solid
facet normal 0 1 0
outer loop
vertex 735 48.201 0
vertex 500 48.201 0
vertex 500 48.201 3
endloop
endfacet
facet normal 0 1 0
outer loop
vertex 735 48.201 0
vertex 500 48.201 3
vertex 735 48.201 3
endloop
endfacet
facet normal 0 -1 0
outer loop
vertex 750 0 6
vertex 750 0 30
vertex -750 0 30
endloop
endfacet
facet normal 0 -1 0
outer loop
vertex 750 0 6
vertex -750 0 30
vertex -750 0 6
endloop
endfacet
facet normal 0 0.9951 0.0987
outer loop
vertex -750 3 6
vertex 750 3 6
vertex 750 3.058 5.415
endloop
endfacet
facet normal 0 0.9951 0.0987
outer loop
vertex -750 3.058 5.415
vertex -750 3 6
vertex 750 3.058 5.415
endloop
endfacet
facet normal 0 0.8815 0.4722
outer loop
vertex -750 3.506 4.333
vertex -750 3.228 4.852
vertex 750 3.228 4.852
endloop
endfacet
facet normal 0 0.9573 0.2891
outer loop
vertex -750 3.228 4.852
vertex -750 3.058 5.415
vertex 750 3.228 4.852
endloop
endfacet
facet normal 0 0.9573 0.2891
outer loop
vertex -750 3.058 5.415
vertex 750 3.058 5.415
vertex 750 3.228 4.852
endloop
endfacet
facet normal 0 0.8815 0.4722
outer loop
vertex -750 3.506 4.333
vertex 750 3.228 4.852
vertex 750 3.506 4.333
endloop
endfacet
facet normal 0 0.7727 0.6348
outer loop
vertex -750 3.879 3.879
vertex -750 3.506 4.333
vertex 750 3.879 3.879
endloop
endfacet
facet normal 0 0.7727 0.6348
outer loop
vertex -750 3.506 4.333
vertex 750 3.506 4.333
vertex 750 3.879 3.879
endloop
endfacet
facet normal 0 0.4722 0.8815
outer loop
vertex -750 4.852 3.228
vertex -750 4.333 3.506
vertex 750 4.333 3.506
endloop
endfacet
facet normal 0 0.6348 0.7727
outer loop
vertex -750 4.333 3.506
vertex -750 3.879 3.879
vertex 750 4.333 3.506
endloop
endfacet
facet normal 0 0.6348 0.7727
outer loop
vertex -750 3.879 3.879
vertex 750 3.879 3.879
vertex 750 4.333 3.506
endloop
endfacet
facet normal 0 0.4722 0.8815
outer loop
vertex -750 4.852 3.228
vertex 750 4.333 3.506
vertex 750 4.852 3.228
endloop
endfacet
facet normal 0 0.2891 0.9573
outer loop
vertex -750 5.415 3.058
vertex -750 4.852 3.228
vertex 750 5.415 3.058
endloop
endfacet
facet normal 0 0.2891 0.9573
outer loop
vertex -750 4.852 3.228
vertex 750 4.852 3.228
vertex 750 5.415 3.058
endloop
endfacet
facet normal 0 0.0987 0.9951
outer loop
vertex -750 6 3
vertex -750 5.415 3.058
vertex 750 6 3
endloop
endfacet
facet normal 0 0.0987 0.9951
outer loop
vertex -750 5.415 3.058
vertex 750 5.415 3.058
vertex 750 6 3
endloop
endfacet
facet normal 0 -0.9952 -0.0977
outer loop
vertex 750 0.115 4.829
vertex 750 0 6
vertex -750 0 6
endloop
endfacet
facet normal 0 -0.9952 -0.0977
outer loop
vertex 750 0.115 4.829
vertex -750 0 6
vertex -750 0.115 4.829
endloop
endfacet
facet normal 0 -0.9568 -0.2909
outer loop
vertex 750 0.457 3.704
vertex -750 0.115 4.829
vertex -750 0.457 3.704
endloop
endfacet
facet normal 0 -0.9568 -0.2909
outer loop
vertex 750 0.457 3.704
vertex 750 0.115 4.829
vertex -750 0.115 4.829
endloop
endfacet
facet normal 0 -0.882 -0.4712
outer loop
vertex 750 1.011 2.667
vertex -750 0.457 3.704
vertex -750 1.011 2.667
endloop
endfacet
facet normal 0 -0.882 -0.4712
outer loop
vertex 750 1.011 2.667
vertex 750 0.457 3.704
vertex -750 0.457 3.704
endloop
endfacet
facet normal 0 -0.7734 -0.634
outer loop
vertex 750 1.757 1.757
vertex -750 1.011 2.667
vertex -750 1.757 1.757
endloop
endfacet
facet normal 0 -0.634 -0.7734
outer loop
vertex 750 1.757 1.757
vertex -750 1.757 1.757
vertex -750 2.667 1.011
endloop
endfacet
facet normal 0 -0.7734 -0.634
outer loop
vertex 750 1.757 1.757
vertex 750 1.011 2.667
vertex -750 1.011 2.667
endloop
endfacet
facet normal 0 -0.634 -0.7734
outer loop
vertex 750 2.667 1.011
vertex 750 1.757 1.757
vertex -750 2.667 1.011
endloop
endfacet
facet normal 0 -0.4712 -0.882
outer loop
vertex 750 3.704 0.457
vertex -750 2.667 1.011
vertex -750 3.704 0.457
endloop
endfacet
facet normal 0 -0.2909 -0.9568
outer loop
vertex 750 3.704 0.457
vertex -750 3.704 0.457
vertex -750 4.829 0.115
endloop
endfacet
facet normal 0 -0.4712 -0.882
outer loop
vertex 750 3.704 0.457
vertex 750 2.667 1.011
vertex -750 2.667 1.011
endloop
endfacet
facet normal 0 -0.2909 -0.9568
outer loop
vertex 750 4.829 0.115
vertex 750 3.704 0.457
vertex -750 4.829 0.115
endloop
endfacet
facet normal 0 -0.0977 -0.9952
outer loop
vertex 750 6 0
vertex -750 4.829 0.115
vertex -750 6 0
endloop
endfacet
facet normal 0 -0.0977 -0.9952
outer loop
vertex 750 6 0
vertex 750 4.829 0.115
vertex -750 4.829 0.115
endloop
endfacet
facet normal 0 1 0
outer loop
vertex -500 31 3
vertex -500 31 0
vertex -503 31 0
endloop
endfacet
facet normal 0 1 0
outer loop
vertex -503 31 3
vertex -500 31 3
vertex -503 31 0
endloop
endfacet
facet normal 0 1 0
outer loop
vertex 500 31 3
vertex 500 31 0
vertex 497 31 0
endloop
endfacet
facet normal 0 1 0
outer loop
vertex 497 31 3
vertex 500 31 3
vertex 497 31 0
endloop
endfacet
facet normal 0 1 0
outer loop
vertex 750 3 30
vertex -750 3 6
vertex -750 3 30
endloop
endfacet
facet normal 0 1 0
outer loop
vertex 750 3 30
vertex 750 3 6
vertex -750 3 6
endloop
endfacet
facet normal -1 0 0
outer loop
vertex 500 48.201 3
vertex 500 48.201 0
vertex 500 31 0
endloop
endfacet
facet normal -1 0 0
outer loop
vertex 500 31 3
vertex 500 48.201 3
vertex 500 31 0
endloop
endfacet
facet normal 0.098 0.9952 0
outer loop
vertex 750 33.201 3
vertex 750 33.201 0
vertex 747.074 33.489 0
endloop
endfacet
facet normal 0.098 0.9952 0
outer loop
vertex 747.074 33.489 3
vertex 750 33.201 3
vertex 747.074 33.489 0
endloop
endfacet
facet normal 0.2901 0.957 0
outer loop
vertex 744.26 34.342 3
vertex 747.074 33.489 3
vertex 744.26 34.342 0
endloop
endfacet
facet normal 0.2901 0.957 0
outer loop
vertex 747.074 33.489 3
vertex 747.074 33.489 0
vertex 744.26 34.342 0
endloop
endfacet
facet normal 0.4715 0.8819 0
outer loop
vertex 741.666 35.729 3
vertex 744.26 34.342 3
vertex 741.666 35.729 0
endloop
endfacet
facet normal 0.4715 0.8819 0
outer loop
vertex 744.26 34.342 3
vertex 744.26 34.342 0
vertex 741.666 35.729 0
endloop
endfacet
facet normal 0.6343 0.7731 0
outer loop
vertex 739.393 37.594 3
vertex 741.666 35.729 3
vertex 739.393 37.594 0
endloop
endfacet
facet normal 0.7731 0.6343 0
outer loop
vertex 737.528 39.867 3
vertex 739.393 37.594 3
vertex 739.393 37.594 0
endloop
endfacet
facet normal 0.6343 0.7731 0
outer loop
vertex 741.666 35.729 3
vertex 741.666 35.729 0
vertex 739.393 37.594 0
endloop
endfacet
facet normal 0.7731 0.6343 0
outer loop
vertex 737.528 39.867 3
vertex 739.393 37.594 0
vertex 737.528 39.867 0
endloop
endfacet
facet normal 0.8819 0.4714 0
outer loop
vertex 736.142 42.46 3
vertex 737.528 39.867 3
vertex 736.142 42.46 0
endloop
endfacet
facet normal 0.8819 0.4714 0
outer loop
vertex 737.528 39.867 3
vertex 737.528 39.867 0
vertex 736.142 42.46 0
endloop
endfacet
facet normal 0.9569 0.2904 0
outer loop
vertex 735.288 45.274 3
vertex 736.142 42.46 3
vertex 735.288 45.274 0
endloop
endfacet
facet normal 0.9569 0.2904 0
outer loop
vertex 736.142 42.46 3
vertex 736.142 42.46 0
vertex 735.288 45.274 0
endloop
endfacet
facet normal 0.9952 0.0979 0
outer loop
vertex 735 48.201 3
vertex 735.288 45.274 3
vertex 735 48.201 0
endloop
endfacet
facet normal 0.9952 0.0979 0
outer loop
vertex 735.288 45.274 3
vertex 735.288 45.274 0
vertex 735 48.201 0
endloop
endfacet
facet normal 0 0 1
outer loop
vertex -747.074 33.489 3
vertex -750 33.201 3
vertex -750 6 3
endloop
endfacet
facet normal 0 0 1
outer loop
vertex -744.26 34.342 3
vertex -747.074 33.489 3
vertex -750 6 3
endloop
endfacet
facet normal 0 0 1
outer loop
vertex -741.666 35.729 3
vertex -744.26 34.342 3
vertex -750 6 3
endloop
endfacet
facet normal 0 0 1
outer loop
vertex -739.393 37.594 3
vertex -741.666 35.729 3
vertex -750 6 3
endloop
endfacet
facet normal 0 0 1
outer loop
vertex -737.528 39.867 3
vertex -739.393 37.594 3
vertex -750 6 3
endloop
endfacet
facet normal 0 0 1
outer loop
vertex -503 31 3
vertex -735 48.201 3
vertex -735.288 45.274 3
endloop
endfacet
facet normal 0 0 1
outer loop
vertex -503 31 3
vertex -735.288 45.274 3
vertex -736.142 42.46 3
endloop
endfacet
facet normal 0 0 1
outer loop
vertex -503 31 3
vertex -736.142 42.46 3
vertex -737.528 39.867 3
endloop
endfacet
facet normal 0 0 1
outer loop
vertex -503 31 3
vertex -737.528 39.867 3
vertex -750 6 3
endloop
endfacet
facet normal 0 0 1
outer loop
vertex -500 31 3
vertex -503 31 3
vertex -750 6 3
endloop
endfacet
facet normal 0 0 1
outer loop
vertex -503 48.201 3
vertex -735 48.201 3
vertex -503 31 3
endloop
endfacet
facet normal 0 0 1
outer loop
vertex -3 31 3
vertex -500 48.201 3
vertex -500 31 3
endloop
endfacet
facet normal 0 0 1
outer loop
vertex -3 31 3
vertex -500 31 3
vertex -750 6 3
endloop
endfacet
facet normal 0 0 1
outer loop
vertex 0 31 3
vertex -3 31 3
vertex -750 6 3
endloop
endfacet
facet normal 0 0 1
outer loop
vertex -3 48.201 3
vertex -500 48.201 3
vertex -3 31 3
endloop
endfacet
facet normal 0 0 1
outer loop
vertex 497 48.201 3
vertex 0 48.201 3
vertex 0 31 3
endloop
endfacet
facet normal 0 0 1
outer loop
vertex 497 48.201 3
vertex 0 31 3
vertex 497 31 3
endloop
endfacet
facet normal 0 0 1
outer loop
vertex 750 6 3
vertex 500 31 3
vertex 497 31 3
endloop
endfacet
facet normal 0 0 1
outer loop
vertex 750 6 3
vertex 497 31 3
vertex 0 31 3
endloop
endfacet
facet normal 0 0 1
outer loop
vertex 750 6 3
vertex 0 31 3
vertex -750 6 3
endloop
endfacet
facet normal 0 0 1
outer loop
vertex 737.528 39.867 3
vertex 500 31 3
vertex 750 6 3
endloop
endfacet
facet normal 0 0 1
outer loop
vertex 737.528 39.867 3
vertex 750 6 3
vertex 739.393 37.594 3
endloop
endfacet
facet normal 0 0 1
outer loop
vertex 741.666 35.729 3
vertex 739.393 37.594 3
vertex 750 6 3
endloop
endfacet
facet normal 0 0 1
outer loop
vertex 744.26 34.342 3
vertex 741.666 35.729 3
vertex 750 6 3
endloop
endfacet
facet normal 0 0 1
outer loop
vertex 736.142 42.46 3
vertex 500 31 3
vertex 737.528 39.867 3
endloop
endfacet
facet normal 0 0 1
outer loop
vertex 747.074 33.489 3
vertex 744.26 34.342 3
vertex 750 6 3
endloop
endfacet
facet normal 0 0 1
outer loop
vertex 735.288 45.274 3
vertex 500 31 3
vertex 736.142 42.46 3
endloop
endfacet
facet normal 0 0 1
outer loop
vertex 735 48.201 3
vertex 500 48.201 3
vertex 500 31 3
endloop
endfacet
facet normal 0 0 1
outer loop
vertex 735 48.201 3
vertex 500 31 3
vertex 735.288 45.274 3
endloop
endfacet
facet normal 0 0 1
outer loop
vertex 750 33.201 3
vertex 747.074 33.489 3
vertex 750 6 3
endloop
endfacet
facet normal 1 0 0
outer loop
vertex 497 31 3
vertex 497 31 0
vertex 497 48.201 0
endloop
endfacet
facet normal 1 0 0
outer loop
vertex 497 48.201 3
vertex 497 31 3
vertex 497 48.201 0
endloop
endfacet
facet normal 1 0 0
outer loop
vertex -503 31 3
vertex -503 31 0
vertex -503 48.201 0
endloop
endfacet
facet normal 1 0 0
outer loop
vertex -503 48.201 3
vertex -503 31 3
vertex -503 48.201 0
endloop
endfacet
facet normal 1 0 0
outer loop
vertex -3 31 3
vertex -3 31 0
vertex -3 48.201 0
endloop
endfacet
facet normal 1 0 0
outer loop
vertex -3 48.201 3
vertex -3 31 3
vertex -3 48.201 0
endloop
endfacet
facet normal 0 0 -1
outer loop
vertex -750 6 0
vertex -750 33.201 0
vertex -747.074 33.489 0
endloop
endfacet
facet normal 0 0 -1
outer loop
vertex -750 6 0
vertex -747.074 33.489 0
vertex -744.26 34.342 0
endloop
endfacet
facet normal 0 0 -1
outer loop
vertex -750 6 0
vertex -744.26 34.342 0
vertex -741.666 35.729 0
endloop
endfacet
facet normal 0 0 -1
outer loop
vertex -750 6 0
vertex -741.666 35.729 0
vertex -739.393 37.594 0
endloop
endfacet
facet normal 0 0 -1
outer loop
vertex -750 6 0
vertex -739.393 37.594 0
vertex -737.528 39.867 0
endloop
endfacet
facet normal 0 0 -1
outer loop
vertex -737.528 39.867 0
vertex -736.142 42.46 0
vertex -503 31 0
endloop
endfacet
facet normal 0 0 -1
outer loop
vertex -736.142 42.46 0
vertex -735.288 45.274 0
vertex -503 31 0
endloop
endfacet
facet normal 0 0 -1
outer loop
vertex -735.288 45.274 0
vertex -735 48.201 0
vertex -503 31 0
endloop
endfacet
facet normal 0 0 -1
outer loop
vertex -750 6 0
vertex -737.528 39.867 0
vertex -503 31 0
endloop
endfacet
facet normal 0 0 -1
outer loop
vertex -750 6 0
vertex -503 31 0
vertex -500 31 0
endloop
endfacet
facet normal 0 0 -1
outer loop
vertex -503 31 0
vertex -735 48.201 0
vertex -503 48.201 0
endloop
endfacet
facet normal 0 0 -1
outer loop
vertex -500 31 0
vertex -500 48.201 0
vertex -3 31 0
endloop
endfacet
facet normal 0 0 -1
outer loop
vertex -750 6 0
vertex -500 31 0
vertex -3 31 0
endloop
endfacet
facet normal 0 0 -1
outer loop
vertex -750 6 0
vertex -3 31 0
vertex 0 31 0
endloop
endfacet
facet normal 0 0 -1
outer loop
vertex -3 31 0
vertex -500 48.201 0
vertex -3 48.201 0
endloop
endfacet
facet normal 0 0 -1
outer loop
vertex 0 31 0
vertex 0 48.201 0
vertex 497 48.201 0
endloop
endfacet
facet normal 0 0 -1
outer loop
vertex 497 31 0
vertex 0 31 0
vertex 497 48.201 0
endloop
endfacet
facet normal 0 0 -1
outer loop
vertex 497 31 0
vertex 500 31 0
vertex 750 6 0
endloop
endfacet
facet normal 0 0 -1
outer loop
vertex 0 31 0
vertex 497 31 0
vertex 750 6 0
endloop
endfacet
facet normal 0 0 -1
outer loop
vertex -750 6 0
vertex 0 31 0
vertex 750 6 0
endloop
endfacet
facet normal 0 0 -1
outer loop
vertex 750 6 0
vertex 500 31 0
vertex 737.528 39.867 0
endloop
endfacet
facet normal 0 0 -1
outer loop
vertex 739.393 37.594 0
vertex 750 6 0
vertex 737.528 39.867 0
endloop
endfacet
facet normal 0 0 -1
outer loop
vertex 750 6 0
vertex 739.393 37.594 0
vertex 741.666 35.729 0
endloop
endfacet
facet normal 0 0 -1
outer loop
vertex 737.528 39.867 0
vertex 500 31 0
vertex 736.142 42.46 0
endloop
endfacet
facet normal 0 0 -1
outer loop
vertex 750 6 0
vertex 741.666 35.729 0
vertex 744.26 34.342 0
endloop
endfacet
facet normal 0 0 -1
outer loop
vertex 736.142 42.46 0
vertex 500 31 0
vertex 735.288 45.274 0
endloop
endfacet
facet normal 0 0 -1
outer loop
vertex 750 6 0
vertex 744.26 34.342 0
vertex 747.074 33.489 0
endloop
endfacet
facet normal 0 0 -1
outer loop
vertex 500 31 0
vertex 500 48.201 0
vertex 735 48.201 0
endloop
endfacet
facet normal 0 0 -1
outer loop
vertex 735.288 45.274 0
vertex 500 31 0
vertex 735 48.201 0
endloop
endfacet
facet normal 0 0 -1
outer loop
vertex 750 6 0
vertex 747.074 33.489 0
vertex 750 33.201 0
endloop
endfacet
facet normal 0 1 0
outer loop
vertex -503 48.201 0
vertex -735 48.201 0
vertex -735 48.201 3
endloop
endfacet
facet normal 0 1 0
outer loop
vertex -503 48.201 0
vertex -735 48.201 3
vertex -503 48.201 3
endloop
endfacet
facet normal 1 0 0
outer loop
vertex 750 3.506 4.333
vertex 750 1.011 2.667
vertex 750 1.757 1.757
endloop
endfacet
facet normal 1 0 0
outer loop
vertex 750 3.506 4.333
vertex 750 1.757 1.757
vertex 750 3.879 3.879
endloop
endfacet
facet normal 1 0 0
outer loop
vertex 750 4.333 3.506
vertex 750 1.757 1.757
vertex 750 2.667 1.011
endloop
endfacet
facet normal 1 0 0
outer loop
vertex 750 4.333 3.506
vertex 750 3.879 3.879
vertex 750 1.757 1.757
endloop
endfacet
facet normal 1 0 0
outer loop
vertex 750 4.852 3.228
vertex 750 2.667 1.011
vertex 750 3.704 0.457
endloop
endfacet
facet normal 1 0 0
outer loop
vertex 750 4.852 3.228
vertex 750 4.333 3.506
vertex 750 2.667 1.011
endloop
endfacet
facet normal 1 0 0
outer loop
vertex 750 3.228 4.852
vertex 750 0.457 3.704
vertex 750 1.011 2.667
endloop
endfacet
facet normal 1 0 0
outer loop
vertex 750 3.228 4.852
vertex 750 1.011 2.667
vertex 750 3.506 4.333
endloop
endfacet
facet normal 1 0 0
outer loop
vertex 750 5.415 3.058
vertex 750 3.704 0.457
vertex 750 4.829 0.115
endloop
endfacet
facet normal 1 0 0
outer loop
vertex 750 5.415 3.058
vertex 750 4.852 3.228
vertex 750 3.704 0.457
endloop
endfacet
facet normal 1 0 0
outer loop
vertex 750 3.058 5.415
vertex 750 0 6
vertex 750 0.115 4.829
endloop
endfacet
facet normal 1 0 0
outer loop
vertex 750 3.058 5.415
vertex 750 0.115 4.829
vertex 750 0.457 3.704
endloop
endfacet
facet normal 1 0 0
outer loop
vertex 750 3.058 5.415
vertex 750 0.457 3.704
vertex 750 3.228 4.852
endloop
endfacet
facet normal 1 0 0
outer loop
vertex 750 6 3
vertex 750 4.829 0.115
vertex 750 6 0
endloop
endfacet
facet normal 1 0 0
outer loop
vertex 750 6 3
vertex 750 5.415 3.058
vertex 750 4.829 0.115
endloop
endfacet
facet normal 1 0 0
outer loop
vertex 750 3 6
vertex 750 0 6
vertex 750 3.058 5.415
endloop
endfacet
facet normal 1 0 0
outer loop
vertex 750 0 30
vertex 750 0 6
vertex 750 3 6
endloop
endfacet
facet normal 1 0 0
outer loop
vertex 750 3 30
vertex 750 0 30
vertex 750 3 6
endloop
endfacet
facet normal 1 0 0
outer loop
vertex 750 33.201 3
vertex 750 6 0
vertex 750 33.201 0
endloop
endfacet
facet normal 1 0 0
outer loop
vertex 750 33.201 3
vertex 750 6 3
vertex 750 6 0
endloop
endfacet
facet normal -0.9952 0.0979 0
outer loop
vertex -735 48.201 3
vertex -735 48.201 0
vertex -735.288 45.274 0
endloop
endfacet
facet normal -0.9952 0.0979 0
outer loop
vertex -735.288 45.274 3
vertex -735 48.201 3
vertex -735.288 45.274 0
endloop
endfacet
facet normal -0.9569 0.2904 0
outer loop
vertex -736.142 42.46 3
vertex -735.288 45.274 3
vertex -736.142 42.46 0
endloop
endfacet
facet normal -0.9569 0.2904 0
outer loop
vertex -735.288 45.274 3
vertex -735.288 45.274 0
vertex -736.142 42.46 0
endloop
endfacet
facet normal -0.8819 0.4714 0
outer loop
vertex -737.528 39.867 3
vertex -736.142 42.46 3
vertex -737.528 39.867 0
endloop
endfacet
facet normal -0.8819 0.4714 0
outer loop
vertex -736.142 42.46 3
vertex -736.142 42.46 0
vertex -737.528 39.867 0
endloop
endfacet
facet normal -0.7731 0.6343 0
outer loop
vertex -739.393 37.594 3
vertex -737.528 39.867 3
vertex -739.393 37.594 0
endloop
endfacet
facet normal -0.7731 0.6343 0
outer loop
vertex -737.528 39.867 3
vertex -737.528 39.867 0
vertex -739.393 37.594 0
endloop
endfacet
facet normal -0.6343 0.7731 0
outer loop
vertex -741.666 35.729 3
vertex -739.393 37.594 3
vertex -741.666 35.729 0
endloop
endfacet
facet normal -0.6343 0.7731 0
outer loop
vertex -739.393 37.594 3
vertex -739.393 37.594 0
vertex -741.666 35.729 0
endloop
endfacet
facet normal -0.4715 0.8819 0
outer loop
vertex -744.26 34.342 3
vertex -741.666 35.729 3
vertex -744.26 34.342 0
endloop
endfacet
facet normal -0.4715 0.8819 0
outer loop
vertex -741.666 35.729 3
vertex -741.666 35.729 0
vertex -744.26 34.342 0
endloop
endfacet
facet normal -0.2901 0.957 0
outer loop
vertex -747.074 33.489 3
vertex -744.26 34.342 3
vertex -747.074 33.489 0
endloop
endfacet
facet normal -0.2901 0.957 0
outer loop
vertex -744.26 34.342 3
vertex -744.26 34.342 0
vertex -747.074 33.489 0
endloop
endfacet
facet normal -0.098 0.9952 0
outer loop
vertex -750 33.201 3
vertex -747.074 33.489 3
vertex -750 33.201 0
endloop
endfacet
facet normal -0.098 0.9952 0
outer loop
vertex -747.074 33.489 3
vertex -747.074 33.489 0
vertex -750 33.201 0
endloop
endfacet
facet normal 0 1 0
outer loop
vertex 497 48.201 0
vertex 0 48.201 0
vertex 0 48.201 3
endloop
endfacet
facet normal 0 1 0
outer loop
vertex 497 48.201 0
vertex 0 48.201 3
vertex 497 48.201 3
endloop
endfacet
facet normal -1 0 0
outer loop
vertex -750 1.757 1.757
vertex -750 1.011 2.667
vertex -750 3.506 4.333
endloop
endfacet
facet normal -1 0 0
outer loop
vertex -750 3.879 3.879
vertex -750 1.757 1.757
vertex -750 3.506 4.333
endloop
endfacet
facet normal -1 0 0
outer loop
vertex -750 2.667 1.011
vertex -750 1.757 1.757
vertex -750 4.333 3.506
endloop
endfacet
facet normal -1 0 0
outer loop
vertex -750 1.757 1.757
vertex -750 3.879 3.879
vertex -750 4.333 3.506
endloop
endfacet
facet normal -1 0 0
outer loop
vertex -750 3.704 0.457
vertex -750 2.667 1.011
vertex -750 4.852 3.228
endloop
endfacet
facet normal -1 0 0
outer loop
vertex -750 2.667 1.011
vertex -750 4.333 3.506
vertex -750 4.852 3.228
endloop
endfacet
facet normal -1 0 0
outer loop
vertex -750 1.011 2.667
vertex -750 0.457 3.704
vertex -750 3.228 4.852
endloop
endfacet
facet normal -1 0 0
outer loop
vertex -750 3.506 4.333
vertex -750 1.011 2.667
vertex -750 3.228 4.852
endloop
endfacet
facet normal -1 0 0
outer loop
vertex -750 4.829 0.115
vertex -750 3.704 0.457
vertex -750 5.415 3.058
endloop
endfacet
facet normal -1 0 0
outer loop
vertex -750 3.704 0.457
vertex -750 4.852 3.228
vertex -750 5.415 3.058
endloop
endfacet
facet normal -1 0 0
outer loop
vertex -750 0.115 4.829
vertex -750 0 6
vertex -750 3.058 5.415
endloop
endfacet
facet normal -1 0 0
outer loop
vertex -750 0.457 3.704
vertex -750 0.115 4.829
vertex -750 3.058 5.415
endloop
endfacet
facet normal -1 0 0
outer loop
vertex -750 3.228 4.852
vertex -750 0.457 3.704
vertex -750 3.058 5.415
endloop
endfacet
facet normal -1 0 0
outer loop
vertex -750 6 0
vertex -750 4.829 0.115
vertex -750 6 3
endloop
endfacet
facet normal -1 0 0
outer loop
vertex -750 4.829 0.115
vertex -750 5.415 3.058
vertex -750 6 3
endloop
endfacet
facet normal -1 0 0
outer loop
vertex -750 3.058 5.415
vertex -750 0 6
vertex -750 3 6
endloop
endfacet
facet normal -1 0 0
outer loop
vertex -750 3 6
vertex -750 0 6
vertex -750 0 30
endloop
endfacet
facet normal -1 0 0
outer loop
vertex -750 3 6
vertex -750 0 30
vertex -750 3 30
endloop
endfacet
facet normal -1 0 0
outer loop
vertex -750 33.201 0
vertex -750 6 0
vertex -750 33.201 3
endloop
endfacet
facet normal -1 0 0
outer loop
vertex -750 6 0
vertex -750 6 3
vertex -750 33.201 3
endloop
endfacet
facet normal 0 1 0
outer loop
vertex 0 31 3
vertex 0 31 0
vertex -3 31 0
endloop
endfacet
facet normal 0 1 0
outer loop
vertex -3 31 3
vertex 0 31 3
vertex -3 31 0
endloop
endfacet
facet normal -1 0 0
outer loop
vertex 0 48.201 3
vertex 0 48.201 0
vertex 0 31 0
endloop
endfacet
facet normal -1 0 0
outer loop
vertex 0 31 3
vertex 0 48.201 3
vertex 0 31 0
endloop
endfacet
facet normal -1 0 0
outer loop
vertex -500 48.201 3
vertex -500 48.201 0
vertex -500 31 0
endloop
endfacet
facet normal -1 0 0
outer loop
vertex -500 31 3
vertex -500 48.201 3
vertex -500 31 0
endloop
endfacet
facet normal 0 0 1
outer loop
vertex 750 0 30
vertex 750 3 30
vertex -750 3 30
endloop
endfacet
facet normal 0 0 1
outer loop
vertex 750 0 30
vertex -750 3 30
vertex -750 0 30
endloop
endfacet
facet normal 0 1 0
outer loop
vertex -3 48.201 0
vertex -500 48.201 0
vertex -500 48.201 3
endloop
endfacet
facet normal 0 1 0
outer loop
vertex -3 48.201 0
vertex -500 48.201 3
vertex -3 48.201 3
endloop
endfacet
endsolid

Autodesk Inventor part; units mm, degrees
ref_plane "YZ Plane" through (0, 0, 0) normal (1, 0, 0) x (0, 1, 0)
ref_plane "XZ Plane" through (0, 0, 0) normal (0, 1, 0) x (-1, 0, 0)
ref_plane "XY Plane" through (0, 0, 0) normal (0, 0, 1) x (1, 0, 0)
sketch "Sketch1" plane through (0, 0, 0) normal (0, 0, 1) x (1, 0, 0)
  line L0 (-750, 48.2006) -> (750, 48.2006)
  line L1 (750, 48.2006) -> (750, 0)
  line L2 (750, 0) -> (-750, 0)
  line L3 (-750, 0) -> (-750, 48.2006)
  point P0 (0, 0)
  point P1 (0, 0)
  dimension "d0" = 1500
  dimension "d1" = 48.2006
extrude "Plate1" add sketch "Sketch1" along normal blind 3
sketch "Sketch2" plane through (750, 3, 0) normal (0, -1, 0) x (1, 0, 0)
  line L0 (-1500, 0) -> (0, 0)
  line L1 (0, 0) -> (0, 30)
  line L2 (0, 30) -> (-1500, 30)
  line L3 (-1500, 30) -> (-1500, 0)
edge flange "Flange1" height 30 angle 90 thickness 3 bend radius 3 thickness toward (0, -1, 0) relief tear relief width 3 relief depth 1.5 edges at (0, 0, 3) wall of the first edge with corners at (-750, 3, 0) (750, 3, 0) (750, 3, 30) (-750, 3, 30)
bend "Bend1"
corner "Corner1"
sketch "Sketch5" plane through (0, 0, 0) normal (0, 0, -1) x (-1, 0, 0)
  line L0 (750, 48.2006) -> (-750, 48.2006) projected
  line L1 (500, 48.2006) -> (500, 31)
  line L2 (500, 31) -> (503, 31)
  line L3 (503, 31) -> (503, 48.2006)
  line L4 (750, 0) -> (-750, 0) projected
  point P0 (0, 0)
  dimension "d18" = 3
  dimension "d19" = 247
  dimension "d20" = 31
extrude "Extrusion1" cut sketch "Sketch5" against normal through all
pattern_linear "Rectangular Pattern1" count 3 spacing 500 along (1, 0, 0) of "Extrusion1"
sketch "Sketch6" plane through (0, 0, 0) normal (0, 0, -1) x (-1, 0, 0)
  line L0 (-750, 48.2006) -> (-750, 6) projected
  circle A0 centre (-750, 48.2006) radius 15
  line L1 (-750, 48.2006) -> (-500, 48.2006) projected
  point P0 (0, 0)
  point P1 (-735, 48.2006)
  point P2 (-750, 33.2006)
  dimension "d24" = 30
extrude "Extrusion2" cut sketch "Sketch6" against normal through all contours L1 A0 L0 picked at (-740.1254, 47.088)
mirror "Mirror1" about plane through (0, 0, 0) normal (1, 0, 0) of "Extrusion2"
equation "\"d1\" = Стрингер_4"
equation "\"d18\" = Thickness"
equation "\"d2\" = Thickness"
equation "\"d3\" = BendReliefWidth"
equation "\"d4\" = BendReliefDepth"
equation "\"d5\" = MinimumRemnant"
equation "\"d6\" = TransitionRadius"
equation "\"d9\" = BendRadius"
equation "\"d10\" = CornerReliefSize"
equation "\"d11\" = GapSize"
equation "\"d12\" = JacobiRadiusSize"
equation "\"BendRadius\" = Thickness"
equation "\"BendReliefWidth\" = Thickness"
equation "\"BendReliefDepth\" = 0.5 * Thickness"
equation "\"CornerReliefSize\" = 4 * Thickness"
equation "\"MinimumRemnant\" = 2 * Thickness"
equation "\"TransitionRadius\" = BendRadius"
equation "\"JacobiRadiusSize\" = BendRadius"
equation "\"GapSize\" = Thickness"
equation "\"Стрингер_4\" = 48.200578"
equation "\"Thickness\" = 3"
properties part number "МОО 054 стрингер борт 41"
